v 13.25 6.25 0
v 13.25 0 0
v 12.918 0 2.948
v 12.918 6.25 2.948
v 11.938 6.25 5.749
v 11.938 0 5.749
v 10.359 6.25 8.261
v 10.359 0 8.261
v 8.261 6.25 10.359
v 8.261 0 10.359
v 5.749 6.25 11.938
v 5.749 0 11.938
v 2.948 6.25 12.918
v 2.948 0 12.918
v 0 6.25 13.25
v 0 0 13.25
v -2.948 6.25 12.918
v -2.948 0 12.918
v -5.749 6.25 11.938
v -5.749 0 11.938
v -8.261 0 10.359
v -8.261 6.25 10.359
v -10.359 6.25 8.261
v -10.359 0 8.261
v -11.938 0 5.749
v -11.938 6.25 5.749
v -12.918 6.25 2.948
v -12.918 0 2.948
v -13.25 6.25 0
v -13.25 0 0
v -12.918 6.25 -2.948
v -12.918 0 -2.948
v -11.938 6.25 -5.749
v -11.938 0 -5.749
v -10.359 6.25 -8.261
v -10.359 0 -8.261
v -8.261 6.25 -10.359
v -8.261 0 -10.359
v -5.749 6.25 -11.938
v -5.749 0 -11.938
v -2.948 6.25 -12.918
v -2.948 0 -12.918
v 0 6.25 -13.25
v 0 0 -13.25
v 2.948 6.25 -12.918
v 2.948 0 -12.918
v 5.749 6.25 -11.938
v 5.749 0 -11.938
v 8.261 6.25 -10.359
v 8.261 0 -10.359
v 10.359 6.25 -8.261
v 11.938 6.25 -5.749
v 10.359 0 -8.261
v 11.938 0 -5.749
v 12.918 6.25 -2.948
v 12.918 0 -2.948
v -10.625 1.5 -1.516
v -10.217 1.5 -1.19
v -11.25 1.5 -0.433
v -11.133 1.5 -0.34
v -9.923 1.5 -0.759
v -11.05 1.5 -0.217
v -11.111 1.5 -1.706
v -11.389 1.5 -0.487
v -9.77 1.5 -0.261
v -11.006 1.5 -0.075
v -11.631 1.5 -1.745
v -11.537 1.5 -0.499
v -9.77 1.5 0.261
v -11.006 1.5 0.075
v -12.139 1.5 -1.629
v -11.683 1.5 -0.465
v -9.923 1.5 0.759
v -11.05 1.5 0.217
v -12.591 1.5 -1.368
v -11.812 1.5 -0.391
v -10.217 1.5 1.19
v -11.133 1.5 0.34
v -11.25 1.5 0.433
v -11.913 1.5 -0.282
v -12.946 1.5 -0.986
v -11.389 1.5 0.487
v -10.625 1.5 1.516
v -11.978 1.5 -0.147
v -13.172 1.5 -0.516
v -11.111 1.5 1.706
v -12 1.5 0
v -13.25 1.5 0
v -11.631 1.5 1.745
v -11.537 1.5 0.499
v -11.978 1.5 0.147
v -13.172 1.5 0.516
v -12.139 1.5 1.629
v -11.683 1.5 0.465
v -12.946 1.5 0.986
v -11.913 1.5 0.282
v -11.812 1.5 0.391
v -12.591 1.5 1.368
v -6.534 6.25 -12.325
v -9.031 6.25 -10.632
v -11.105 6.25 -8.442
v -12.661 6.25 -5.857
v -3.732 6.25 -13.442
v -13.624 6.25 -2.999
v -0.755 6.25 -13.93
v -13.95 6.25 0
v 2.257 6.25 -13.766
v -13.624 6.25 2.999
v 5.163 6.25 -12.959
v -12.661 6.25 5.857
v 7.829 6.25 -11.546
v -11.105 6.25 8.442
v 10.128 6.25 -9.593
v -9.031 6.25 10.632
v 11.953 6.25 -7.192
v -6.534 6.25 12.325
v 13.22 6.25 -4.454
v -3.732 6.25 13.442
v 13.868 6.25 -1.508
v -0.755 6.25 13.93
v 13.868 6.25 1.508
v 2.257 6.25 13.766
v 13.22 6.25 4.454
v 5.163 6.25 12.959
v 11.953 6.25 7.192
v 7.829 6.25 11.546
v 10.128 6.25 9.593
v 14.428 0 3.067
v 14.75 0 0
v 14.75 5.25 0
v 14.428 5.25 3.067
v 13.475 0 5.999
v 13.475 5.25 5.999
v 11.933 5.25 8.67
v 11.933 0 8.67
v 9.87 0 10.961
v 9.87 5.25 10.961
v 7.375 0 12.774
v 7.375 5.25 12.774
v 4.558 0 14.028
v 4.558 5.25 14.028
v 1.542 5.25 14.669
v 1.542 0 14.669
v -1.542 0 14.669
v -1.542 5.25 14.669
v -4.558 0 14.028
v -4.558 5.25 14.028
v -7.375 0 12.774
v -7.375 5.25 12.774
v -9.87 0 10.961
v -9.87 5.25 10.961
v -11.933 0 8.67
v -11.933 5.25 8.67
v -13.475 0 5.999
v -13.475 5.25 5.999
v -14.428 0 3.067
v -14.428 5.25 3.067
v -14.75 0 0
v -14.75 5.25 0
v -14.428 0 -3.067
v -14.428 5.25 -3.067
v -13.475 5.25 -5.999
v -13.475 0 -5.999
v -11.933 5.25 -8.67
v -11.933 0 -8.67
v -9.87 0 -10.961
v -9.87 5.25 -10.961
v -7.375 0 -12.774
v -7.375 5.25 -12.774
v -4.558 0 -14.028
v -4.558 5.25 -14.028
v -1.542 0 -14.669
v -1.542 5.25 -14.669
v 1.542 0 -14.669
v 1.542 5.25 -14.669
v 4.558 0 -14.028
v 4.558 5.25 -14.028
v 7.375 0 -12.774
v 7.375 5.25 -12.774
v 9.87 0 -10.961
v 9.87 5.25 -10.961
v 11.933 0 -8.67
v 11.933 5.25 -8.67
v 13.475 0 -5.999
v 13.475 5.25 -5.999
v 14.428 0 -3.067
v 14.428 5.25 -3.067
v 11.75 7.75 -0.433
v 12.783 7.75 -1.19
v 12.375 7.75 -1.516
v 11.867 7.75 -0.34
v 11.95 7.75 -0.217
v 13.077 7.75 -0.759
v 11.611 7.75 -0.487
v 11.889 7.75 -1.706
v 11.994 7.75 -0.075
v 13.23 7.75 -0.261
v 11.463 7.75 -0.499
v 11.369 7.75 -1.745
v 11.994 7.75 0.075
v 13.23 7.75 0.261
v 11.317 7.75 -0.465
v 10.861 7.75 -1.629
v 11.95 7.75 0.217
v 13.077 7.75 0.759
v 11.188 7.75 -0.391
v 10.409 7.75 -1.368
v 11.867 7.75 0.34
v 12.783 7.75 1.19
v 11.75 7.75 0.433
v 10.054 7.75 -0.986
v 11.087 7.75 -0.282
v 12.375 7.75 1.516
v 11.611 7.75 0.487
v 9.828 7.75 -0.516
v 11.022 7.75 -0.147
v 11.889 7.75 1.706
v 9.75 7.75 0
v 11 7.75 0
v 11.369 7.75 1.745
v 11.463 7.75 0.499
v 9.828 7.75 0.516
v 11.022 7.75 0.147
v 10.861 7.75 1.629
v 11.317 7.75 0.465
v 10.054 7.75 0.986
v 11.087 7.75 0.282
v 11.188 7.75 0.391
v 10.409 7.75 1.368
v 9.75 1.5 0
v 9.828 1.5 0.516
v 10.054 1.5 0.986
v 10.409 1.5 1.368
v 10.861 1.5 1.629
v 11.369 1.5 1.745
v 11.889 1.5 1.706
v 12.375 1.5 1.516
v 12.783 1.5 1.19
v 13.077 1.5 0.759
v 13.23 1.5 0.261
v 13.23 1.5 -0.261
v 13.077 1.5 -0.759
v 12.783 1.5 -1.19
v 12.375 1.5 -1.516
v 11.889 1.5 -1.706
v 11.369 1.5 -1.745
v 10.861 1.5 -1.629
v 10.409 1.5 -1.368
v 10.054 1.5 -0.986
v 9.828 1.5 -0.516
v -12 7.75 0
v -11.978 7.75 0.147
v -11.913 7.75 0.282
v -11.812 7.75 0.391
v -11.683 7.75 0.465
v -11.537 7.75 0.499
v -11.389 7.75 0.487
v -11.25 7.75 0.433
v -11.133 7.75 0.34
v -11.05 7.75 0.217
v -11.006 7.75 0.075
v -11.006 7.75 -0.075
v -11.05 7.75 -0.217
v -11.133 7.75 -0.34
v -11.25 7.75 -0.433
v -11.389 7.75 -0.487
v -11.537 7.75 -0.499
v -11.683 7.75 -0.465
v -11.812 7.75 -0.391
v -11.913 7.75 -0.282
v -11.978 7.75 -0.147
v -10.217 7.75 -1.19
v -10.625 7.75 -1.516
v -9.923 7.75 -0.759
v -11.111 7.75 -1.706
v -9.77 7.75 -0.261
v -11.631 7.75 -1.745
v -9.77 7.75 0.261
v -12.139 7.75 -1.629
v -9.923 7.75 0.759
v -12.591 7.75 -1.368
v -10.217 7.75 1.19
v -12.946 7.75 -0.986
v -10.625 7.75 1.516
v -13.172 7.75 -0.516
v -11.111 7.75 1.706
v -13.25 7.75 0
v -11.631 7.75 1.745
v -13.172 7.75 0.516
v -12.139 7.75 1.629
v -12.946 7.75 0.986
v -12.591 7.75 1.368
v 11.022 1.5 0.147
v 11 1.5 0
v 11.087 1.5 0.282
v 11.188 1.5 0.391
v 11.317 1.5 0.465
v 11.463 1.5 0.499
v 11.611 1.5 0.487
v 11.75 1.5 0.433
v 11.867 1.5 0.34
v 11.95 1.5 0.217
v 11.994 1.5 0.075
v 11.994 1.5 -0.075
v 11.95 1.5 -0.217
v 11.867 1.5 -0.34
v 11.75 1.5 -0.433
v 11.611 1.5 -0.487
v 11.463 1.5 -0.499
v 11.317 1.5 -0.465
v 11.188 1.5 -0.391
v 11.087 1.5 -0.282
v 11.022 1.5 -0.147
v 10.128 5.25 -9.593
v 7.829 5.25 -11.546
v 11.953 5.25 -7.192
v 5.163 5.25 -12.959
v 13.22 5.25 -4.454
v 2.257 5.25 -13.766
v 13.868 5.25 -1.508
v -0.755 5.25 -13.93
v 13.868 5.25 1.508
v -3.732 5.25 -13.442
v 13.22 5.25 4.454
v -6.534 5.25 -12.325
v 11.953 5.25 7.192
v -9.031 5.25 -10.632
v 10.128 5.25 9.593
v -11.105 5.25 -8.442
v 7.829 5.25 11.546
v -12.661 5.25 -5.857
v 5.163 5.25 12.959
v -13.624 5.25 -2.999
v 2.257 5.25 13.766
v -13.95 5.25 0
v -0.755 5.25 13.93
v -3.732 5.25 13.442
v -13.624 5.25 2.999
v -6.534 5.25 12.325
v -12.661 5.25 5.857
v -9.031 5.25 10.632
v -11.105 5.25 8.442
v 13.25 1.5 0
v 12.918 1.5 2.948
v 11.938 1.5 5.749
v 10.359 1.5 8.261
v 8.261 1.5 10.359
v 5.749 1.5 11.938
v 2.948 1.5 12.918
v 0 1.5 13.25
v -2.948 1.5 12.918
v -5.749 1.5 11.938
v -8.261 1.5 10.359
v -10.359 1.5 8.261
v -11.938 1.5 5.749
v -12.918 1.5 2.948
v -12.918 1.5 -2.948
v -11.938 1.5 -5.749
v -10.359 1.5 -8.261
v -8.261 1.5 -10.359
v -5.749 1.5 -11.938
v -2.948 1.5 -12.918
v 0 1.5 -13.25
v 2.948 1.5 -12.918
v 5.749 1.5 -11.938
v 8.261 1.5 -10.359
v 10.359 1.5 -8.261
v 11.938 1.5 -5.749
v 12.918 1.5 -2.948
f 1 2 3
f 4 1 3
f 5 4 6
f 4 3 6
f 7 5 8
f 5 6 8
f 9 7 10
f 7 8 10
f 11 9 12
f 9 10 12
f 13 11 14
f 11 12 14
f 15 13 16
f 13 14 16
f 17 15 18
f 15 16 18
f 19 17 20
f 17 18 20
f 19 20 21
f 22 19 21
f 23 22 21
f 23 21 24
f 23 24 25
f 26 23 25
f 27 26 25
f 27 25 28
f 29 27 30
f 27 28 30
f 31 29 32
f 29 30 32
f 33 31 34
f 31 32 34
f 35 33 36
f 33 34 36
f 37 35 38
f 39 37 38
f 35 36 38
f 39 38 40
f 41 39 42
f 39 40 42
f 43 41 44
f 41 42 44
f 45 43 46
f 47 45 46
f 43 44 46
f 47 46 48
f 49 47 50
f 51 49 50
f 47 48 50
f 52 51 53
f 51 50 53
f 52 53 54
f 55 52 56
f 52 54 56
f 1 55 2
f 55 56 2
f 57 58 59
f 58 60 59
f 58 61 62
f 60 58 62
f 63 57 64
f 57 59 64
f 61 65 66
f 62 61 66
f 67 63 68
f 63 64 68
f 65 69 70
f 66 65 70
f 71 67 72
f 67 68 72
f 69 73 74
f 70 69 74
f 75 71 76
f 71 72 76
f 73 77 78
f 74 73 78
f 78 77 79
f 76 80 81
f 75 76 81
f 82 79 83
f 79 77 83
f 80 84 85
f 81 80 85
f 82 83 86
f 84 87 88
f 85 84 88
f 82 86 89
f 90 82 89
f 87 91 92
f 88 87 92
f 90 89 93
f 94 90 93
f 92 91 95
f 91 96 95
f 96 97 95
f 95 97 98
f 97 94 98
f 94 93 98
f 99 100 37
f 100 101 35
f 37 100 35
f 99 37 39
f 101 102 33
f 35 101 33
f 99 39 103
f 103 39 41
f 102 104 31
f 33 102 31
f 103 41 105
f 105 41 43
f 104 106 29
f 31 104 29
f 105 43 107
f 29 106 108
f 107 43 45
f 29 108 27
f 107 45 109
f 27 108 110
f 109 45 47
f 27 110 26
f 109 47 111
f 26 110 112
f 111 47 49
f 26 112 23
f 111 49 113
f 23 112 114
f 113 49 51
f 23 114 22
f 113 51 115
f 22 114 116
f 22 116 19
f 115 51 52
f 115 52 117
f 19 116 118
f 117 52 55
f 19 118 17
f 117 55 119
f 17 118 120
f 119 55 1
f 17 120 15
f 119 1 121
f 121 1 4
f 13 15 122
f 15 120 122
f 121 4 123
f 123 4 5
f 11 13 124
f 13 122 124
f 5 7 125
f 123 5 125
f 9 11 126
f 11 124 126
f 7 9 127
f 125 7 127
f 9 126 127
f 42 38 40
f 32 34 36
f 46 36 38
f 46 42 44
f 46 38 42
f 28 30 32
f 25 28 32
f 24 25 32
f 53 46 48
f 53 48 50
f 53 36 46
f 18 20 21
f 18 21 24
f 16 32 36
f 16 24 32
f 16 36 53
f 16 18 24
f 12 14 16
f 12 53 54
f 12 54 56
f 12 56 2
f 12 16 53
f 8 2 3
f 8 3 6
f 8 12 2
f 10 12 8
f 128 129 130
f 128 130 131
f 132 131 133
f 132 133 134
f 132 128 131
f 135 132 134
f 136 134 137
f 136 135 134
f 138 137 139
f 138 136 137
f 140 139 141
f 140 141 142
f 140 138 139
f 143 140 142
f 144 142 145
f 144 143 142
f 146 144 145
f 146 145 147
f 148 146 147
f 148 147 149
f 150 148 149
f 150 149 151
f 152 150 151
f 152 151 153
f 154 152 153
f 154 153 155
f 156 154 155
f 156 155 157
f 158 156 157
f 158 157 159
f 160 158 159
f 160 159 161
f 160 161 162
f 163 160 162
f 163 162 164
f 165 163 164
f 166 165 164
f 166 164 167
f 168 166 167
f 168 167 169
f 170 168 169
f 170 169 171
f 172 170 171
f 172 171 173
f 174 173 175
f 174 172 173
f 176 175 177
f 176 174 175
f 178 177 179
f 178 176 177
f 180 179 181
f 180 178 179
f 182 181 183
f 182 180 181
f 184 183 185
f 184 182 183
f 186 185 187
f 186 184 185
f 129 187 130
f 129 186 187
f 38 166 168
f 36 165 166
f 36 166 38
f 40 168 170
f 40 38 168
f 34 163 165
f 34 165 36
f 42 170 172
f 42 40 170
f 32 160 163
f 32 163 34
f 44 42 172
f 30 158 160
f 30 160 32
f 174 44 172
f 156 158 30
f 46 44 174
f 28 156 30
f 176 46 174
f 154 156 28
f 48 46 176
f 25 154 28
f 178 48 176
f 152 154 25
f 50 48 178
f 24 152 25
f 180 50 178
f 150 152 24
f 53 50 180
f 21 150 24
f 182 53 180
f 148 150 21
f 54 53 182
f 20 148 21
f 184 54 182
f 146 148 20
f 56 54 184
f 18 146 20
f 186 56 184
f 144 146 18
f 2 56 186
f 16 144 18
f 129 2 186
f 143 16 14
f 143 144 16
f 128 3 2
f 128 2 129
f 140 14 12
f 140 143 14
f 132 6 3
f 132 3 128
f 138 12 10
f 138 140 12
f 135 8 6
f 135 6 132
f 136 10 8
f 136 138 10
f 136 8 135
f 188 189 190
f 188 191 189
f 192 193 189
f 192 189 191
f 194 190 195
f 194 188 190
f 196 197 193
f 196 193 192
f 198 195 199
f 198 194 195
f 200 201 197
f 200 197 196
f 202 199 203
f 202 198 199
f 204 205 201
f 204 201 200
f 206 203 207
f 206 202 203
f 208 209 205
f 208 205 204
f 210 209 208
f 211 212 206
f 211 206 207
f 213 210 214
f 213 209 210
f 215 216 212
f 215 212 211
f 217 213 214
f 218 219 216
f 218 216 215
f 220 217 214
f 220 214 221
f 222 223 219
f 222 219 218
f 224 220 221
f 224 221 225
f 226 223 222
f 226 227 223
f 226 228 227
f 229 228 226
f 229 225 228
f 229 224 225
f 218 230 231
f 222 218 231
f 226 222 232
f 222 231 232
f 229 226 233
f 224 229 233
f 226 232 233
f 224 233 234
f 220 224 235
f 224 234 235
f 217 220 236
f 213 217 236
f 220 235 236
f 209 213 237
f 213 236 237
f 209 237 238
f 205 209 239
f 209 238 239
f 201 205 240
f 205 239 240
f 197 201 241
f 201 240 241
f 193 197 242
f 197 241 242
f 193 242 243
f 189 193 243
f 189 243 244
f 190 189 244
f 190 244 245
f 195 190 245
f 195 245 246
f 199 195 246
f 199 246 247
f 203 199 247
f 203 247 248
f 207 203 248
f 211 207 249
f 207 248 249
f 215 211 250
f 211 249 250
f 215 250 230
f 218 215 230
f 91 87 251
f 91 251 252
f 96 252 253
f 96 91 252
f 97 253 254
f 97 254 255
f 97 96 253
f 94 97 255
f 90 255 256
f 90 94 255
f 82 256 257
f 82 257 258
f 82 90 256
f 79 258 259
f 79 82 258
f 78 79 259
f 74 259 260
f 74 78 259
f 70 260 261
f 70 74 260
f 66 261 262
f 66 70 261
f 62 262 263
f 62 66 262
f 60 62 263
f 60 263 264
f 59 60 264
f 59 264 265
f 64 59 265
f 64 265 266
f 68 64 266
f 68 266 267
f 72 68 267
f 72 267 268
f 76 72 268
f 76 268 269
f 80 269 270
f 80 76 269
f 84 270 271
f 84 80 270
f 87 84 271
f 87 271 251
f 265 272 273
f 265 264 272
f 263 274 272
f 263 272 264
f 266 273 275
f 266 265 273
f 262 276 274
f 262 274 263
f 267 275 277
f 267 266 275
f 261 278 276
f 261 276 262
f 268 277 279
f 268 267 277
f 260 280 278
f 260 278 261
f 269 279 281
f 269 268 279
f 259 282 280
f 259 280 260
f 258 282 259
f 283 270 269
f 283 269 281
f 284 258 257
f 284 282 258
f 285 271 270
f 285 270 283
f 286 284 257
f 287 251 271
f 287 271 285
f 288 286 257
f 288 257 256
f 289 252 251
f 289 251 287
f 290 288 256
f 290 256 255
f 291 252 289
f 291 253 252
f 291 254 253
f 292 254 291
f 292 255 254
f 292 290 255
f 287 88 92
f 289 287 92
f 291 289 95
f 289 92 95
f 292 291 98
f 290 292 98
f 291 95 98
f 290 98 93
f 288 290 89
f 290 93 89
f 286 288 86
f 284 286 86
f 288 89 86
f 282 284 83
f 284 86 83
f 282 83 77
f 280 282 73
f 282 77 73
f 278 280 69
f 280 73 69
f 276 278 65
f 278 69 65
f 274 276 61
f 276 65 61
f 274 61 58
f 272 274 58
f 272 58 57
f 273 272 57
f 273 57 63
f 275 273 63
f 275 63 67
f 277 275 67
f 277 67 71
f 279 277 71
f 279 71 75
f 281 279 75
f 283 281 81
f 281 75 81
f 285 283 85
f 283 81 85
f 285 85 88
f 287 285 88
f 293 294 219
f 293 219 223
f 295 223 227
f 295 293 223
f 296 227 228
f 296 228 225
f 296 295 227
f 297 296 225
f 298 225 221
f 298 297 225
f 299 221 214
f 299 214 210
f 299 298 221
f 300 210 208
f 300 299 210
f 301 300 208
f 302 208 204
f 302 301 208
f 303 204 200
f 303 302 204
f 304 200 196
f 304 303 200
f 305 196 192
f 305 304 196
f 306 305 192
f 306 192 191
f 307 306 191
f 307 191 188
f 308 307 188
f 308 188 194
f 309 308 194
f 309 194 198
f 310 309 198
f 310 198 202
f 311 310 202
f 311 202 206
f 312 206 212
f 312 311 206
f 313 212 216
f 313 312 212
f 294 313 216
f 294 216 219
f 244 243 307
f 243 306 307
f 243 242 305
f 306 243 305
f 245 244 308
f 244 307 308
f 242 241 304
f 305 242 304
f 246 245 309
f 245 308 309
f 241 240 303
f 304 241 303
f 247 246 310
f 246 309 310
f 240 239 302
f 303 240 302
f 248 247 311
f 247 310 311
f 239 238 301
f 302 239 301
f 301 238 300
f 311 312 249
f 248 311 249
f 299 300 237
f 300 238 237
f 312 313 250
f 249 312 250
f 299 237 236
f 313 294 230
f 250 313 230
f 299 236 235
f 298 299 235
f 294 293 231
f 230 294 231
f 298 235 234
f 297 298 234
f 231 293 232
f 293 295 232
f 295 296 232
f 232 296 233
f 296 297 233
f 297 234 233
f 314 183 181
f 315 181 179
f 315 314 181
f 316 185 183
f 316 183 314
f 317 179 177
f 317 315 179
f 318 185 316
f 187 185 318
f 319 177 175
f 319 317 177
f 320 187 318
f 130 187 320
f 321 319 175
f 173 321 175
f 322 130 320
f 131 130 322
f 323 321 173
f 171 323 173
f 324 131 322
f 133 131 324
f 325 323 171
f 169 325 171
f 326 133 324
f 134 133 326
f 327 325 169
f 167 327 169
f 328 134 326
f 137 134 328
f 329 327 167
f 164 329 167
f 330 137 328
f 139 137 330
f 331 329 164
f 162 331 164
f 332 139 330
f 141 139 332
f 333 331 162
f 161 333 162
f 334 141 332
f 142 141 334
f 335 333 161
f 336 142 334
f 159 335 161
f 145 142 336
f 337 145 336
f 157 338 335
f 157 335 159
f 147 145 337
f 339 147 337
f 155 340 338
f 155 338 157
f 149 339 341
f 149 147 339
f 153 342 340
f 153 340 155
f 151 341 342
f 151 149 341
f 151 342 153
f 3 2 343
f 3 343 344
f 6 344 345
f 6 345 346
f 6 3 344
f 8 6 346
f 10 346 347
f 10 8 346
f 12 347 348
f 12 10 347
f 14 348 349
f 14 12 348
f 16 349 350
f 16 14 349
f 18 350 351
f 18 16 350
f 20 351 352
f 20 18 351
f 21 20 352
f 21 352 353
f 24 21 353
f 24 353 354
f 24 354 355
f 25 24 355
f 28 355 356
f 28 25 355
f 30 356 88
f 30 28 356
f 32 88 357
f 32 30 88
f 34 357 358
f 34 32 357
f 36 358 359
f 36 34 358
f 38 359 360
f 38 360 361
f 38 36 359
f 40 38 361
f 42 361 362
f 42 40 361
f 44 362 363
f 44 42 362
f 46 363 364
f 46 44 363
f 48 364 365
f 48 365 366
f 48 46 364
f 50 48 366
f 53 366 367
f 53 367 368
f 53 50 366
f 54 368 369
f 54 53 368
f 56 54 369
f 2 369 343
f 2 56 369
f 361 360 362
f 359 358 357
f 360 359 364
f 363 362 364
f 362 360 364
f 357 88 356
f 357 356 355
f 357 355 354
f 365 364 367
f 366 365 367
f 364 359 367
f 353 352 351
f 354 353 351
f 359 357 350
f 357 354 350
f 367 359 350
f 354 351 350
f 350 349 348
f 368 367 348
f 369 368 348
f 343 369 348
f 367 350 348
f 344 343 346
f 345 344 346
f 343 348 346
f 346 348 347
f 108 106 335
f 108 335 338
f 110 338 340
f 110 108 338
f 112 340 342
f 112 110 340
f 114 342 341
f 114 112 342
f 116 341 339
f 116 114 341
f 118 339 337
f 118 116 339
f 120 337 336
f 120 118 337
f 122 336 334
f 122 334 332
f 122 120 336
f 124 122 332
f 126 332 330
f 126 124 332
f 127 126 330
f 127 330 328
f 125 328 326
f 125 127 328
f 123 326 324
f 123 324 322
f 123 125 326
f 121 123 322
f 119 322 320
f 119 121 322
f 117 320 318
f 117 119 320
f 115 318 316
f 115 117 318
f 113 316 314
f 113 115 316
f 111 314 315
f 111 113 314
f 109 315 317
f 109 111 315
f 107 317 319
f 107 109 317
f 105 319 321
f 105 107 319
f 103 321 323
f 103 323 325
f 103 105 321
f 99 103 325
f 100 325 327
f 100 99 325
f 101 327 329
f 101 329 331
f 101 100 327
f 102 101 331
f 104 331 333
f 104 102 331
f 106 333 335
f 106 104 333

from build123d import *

# Parameters (mm, degrees)
F0_R     = 14.75
F0_R_2   = 13.25
F1_DEPTH = 6.25
F2_DEPTH = 1.5
F3_R     = 14.75
F3_R_2   = 13.95
F4_DEPTH = 1
F5_R     = 1.75
F5_R_2   = 0.5
F6_DEPTH = 6.25


with BuildPart() as f1:
    # F0 (on Front) → F1 (new body)
    with BuildSketch(Plane.XZ):
        Circle(F0_R)
        Circle(F0_R_2, mode=Mode.SUBTRACT)
    extrude(amount=-F1_DEPTH)

    # F3 (on face) → F4 (cut)
    with BuildSketch(Plane(origin=(0, 6.25, 0), x_dir=(-1, 0, 0), z_dir=(0, 1, 0))):
        Circle(F3_R)
        Circle(F3_R_2, mode=Mode.SUBTRACT)
    extrude(amount=-F4_DEPTH, mode=Mode.SUBTRACT)


with BuildPart() as f2:
    # F0 (on Front) → F2 (new body)
    with BuildSketch(Plane.XZ):
        Circle(F0_R_2)
    extrude(amount=-F2_DEPTH)


with BuildPart() as f6:
    # F5 (on face) → F6 (new body)
    with BuildSketch(Plane(origin=(0, 1.5, 0), x_dir=(-1, 0, 0), z_dir=(0, 1, 0))):
        with Locations((-11.5, 0)):
            Circle(F5_R)
        with Locations((-11.5, 0)):
            Circle(F5_R_2, mode=Mode.SUBTRACT)
        with Locations((11.5, 0)):
            Circle(F5_R)
        with Locations((11.5, 0)):
            Circle(F5_R_2, mode=Mode.SUBTRACT)
    extrude(amount=F6_DEPTH)


solid = Compound([f1.part, f2.part, f6.part])
